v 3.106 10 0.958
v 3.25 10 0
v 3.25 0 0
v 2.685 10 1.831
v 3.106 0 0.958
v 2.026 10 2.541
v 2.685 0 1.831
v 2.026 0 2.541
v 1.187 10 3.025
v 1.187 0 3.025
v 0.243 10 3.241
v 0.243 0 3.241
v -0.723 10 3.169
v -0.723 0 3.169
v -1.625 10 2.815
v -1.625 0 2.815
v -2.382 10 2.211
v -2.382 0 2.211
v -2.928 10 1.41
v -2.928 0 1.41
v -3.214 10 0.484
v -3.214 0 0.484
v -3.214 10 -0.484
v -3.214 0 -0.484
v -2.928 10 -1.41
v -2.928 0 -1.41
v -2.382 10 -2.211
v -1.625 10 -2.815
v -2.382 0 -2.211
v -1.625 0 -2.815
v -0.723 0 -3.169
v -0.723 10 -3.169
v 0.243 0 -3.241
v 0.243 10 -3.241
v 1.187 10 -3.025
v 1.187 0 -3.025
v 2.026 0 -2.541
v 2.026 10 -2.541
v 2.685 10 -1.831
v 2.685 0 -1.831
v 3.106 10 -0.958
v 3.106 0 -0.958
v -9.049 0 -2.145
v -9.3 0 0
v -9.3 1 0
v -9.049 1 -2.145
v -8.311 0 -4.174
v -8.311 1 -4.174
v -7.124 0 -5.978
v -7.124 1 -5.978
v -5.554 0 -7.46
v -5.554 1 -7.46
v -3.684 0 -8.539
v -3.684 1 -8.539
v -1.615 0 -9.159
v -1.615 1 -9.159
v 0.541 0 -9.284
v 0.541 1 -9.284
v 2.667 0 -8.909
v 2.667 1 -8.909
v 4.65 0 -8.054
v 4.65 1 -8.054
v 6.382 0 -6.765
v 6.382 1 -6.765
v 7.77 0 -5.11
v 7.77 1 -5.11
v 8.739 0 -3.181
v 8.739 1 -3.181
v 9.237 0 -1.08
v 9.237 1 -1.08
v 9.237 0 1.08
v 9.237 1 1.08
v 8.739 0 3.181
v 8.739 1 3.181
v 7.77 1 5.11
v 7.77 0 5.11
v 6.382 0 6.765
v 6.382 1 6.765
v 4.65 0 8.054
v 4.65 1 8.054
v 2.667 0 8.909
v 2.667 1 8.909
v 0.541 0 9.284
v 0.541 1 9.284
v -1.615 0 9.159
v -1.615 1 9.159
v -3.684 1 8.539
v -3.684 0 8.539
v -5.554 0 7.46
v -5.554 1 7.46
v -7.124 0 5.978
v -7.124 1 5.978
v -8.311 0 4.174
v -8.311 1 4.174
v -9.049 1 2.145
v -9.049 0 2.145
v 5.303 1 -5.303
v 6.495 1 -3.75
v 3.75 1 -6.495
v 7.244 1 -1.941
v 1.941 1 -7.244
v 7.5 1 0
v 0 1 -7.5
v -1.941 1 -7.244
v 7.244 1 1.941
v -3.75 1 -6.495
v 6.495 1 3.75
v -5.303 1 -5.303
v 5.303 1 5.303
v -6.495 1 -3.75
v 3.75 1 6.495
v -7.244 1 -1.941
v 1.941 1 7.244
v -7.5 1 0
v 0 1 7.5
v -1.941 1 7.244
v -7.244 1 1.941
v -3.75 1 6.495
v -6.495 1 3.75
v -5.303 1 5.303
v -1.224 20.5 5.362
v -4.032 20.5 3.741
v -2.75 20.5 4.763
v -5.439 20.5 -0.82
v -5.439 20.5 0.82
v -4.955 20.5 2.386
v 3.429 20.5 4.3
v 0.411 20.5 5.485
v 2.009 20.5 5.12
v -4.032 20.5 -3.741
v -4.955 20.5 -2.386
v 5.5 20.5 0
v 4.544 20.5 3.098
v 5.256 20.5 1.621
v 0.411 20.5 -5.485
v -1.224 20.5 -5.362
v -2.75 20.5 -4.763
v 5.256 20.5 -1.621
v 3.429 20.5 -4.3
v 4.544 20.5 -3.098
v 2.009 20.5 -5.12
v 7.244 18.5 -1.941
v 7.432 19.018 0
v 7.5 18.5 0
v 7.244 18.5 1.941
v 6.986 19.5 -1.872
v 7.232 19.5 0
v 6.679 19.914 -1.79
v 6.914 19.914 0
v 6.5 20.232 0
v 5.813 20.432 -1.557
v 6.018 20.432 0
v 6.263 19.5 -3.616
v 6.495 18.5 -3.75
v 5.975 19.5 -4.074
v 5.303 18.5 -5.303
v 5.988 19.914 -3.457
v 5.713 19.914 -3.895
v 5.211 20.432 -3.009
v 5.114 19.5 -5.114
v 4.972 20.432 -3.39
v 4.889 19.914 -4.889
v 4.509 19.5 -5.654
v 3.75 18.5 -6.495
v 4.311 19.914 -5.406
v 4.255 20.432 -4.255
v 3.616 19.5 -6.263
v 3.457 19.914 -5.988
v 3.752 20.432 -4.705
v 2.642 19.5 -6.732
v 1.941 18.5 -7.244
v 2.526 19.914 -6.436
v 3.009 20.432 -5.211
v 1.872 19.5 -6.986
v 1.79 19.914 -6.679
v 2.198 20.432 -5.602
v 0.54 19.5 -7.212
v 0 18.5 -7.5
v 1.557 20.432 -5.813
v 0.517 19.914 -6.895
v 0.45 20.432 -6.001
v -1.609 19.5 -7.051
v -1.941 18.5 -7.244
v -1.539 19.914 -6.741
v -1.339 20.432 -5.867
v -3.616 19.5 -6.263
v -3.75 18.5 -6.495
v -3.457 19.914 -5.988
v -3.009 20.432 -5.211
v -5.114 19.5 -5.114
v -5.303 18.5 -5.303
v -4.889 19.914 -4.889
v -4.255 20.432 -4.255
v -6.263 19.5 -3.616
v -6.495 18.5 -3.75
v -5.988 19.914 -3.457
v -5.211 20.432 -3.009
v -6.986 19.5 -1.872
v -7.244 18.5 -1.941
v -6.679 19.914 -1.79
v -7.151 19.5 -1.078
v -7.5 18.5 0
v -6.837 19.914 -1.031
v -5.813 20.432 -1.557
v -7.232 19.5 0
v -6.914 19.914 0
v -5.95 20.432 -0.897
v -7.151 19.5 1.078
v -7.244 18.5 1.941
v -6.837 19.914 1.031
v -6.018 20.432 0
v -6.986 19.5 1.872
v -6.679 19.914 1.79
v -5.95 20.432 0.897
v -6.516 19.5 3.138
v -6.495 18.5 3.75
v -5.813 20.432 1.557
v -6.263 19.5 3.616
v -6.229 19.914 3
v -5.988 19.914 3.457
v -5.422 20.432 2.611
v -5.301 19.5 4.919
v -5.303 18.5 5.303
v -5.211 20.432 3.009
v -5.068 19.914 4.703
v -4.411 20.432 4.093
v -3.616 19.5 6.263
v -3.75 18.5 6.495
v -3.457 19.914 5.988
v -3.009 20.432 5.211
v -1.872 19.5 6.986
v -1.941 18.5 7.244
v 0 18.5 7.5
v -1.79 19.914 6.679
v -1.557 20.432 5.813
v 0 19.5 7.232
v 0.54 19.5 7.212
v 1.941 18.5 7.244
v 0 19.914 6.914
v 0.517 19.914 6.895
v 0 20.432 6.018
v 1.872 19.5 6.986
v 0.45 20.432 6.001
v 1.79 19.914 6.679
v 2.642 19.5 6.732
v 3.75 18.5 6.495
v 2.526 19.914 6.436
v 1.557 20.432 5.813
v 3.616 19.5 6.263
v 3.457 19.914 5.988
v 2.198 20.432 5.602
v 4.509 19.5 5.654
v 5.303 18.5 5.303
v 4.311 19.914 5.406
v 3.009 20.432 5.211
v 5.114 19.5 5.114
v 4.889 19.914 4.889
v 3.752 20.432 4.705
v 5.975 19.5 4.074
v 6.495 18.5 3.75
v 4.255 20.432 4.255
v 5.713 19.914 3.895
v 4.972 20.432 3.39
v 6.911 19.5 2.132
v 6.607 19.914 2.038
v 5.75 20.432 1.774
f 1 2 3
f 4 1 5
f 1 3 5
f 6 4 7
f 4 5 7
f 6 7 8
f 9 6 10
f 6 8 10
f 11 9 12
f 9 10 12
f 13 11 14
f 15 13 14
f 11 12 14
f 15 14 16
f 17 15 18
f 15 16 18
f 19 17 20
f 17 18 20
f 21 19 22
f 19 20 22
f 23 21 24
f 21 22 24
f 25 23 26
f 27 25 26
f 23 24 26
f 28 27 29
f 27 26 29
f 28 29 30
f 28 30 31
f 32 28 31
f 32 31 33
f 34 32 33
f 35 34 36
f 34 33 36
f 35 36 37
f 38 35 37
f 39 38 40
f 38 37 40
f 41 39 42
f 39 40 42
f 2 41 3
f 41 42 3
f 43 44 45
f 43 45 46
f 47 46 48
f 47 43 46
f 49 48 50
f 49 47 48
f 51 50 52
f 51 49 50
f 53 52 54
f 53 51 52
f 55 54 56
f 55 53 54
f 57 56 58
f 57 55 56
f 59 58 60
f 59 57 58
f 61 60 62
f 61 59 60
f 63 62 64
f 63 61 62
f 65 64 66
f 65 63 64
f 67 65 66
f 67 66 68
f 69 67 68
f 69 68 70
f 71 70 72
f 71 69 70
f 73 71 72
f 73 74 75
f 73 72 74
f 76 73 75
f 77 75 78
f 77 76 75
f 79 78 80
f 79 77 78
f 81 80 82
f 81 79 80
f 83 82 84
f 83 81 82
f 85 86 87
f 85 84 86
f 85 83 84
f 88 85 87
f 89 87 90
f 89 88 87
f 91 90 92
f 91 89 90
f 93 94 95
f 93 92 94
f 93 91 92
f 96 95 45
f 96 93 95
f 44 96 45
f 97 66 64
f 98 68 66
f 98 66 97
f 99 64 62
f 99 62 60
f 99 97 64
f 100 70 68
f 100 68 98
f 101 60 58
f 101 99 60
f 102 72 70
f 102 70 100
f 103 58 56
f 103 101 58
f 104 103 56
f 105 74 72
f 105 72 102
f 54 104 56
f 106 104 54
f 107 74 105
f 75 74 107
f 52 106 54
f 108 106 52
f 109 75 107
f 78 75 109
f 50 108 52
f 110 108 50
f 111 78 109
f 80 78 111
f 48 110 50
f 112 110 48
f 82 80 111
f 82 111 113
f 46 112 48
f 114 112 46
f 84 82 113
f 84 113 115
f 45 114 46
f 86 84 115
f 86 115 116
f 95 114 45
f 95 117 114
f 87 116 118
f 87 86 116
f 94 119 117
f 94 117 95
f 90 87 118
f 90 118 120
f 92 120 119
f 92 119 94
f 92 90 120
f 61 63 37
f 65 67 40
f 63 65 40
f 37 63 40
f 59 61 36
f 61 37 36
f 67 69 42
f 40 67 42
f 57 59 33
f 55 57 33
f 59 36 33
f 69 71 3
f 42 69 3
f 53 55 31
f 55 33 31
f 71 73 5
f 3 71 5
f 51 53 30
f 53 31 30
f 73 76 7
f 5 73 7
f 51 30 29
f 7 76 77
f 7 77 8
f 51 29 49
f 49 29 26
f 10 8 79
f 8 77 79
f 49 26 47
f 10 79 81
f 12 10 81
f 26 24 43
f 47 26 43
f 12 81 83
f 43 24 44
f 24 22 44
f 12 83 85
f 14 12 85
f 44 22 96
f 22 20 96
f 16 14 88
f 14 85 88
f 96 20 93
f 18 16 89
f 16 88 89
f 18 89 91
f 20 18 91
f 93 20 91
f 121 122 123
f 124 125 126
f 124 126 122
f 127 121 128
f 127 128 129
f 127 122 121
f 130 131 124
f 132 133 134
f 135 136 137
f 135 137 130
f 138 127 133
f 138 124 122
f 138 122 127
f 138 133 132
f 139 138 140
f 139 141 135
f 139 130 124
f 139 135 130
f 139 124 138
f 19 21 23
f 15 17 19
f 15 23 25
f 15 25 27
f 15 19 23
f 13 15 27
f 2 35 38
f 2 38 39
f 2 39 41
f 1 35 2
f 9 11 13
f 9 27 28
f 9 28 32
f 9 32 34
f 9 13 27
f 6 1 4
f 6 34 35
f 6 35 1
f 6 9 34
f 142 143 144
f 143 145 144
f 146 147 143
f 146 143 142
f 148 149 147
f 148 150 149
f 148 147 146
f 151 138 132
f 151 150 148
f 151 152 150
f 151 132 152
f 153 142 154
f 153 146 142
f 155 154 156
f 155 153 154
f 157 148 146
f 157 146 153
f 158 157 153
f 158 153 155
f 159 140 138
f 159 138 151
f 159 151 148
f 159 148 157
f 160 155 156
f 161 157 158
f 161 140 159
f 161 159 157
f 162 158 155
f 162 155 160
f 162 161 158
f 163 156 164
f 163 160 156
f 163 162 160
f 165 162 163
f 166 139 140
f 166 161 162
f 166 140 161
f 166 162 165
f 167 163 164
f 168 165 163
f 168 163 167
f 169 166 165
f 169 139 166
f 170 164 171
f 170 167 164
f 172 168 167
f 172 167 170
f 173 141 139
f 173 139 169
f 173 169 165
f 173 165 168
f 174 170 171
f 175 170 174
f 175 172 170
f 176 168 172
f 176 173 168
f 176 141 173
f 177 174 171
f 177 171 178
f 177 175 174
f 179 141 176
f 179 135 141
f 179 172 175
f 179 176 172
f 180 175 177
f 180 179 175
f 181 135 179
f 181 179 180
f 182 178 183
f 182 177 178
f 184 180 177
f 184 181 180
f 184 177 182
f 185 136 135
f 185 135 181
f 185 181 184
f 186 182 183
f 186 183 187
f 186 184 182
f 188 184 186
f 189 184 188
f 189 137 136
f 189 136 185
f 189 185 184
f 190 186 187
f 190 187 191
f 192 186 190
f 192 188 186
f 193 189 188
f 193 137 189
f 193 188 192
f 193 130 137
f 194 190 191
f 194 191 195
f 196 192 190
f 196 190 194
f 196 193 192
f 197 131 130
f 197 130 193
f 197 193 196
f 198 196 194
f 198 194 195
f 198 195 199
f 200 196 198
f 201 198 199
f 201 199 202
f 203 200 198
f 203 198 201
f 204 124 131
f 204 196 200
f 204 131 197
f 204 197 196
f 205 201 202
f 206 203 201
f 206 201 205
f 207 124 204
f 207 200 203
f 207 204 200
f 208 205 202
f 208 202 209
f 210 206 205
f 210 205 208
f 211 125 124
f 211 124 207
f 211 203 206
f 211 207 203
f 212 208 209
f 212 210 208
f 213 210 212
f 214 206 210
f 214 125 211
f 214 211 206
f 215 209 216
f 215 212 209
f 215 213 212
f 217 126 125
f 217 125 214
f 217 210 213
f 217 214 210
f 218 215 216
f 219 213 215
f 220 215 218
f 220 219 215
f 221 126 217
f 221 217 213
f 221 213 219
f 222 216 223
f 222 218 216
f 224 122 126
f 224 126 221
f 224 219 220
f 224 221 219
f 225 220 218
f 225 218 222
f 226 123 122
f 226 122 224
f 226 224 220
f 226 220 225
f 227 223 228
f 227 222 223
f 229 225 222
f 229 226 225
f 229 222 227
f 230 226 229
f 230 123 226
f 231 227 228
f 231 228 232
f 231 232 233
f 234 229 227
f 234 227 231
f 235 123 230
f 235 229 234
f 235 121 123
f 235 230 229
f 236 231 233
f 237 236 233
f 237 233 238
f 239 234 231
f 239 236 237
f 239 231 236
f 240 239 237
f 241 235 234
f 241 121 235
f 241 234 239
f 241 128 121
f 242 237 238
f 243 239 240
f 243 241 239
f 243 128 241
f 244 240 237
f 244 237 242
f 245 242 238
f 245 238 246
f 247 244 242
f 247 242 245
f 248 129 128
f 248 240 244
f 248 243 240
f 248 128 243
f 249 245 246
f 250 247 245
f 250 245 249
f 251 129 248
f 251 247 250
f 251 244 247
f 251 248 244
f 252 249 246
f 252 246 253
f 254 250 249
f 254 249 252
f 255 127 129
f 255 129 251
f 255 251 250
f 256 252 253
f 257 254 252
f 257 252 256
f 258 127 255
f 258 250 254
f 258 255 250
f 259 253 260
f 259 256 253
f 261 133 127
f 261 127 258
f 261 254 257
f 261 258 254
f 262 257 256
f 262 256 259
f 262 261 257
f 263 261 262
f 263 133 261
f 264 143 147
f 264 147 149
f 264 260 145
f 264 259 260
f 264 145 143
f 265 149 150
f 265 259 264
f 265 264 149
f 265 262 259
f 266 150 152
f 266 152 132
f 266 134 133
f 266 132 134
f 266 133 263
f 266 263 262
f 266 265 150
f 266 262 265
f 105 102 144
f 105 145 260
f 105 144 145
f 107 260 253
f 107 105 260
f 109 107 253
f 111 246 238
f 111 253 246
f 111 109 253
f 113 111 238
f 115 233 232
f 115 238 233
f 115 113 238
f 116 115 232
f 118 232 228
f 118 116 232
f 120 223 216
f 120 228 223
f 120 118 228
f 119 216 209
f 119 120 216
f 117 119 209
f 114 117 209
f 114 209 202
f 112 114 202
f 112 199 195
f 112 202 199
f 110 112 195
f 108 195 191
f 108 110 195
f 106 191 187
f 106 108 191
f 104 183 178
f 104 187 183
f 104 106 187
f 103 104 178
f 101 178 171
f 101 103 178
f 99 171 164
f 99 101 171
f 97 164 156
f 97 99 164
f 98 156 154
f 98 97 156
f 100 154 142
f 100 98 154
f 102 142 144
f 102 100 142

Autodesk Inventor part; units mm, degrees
ref_plane "YZ Plane" through (0, 0, 0) normal (1, 0, 0) x (0, 1, 0)
ref_plane "XZ Plane" through (0, 0, 0) normal (0, 1, 0) x (-1, 0, 0)
ref_plane "XY Plane" through (0, 0, 0) normal (0, 0, 1) x (1, 0, 0)
sketch "Esboço1" plane through (0, 0, 0) normal (0, 1, 0) x (-1, 0, 0)
  circle A0 centre (0, 0) radius 9.3
  dimension "d0" = 18.6
extrude "Extrusão1" add sketch "Esboço1" along normal blind 1
sketch "Esboço2" plane through (0, 1, 0) normal (0, 1, 0) x (1, 0, 0)
  circle A0 centre (0, 0) radius 8.3
  circle A1 centre (0, 0) radius 9.3 projected
  circle A2 centre (0, 0) radius 7.5
  dimension "d3" = 1
  dimension "d4" = 15
extrude "Extrusão2" add sketch "Esboço2" along normal blind 19.5 contours A2
fillet "Arredondamento1" radius 2 1 edges at (-7.5, 20.5, 0)
sketch "Esboço6" plane through (0, 0, 0) normal (0, -1, 0) x (1, 0, 0)
  circle A0 centre (0, 0) radius 3.25
  dimension "d13" = 6.5
extrude "Extrusão5" cut sketch "Esboço6" against normal blind 10
properties part number "Knob"
